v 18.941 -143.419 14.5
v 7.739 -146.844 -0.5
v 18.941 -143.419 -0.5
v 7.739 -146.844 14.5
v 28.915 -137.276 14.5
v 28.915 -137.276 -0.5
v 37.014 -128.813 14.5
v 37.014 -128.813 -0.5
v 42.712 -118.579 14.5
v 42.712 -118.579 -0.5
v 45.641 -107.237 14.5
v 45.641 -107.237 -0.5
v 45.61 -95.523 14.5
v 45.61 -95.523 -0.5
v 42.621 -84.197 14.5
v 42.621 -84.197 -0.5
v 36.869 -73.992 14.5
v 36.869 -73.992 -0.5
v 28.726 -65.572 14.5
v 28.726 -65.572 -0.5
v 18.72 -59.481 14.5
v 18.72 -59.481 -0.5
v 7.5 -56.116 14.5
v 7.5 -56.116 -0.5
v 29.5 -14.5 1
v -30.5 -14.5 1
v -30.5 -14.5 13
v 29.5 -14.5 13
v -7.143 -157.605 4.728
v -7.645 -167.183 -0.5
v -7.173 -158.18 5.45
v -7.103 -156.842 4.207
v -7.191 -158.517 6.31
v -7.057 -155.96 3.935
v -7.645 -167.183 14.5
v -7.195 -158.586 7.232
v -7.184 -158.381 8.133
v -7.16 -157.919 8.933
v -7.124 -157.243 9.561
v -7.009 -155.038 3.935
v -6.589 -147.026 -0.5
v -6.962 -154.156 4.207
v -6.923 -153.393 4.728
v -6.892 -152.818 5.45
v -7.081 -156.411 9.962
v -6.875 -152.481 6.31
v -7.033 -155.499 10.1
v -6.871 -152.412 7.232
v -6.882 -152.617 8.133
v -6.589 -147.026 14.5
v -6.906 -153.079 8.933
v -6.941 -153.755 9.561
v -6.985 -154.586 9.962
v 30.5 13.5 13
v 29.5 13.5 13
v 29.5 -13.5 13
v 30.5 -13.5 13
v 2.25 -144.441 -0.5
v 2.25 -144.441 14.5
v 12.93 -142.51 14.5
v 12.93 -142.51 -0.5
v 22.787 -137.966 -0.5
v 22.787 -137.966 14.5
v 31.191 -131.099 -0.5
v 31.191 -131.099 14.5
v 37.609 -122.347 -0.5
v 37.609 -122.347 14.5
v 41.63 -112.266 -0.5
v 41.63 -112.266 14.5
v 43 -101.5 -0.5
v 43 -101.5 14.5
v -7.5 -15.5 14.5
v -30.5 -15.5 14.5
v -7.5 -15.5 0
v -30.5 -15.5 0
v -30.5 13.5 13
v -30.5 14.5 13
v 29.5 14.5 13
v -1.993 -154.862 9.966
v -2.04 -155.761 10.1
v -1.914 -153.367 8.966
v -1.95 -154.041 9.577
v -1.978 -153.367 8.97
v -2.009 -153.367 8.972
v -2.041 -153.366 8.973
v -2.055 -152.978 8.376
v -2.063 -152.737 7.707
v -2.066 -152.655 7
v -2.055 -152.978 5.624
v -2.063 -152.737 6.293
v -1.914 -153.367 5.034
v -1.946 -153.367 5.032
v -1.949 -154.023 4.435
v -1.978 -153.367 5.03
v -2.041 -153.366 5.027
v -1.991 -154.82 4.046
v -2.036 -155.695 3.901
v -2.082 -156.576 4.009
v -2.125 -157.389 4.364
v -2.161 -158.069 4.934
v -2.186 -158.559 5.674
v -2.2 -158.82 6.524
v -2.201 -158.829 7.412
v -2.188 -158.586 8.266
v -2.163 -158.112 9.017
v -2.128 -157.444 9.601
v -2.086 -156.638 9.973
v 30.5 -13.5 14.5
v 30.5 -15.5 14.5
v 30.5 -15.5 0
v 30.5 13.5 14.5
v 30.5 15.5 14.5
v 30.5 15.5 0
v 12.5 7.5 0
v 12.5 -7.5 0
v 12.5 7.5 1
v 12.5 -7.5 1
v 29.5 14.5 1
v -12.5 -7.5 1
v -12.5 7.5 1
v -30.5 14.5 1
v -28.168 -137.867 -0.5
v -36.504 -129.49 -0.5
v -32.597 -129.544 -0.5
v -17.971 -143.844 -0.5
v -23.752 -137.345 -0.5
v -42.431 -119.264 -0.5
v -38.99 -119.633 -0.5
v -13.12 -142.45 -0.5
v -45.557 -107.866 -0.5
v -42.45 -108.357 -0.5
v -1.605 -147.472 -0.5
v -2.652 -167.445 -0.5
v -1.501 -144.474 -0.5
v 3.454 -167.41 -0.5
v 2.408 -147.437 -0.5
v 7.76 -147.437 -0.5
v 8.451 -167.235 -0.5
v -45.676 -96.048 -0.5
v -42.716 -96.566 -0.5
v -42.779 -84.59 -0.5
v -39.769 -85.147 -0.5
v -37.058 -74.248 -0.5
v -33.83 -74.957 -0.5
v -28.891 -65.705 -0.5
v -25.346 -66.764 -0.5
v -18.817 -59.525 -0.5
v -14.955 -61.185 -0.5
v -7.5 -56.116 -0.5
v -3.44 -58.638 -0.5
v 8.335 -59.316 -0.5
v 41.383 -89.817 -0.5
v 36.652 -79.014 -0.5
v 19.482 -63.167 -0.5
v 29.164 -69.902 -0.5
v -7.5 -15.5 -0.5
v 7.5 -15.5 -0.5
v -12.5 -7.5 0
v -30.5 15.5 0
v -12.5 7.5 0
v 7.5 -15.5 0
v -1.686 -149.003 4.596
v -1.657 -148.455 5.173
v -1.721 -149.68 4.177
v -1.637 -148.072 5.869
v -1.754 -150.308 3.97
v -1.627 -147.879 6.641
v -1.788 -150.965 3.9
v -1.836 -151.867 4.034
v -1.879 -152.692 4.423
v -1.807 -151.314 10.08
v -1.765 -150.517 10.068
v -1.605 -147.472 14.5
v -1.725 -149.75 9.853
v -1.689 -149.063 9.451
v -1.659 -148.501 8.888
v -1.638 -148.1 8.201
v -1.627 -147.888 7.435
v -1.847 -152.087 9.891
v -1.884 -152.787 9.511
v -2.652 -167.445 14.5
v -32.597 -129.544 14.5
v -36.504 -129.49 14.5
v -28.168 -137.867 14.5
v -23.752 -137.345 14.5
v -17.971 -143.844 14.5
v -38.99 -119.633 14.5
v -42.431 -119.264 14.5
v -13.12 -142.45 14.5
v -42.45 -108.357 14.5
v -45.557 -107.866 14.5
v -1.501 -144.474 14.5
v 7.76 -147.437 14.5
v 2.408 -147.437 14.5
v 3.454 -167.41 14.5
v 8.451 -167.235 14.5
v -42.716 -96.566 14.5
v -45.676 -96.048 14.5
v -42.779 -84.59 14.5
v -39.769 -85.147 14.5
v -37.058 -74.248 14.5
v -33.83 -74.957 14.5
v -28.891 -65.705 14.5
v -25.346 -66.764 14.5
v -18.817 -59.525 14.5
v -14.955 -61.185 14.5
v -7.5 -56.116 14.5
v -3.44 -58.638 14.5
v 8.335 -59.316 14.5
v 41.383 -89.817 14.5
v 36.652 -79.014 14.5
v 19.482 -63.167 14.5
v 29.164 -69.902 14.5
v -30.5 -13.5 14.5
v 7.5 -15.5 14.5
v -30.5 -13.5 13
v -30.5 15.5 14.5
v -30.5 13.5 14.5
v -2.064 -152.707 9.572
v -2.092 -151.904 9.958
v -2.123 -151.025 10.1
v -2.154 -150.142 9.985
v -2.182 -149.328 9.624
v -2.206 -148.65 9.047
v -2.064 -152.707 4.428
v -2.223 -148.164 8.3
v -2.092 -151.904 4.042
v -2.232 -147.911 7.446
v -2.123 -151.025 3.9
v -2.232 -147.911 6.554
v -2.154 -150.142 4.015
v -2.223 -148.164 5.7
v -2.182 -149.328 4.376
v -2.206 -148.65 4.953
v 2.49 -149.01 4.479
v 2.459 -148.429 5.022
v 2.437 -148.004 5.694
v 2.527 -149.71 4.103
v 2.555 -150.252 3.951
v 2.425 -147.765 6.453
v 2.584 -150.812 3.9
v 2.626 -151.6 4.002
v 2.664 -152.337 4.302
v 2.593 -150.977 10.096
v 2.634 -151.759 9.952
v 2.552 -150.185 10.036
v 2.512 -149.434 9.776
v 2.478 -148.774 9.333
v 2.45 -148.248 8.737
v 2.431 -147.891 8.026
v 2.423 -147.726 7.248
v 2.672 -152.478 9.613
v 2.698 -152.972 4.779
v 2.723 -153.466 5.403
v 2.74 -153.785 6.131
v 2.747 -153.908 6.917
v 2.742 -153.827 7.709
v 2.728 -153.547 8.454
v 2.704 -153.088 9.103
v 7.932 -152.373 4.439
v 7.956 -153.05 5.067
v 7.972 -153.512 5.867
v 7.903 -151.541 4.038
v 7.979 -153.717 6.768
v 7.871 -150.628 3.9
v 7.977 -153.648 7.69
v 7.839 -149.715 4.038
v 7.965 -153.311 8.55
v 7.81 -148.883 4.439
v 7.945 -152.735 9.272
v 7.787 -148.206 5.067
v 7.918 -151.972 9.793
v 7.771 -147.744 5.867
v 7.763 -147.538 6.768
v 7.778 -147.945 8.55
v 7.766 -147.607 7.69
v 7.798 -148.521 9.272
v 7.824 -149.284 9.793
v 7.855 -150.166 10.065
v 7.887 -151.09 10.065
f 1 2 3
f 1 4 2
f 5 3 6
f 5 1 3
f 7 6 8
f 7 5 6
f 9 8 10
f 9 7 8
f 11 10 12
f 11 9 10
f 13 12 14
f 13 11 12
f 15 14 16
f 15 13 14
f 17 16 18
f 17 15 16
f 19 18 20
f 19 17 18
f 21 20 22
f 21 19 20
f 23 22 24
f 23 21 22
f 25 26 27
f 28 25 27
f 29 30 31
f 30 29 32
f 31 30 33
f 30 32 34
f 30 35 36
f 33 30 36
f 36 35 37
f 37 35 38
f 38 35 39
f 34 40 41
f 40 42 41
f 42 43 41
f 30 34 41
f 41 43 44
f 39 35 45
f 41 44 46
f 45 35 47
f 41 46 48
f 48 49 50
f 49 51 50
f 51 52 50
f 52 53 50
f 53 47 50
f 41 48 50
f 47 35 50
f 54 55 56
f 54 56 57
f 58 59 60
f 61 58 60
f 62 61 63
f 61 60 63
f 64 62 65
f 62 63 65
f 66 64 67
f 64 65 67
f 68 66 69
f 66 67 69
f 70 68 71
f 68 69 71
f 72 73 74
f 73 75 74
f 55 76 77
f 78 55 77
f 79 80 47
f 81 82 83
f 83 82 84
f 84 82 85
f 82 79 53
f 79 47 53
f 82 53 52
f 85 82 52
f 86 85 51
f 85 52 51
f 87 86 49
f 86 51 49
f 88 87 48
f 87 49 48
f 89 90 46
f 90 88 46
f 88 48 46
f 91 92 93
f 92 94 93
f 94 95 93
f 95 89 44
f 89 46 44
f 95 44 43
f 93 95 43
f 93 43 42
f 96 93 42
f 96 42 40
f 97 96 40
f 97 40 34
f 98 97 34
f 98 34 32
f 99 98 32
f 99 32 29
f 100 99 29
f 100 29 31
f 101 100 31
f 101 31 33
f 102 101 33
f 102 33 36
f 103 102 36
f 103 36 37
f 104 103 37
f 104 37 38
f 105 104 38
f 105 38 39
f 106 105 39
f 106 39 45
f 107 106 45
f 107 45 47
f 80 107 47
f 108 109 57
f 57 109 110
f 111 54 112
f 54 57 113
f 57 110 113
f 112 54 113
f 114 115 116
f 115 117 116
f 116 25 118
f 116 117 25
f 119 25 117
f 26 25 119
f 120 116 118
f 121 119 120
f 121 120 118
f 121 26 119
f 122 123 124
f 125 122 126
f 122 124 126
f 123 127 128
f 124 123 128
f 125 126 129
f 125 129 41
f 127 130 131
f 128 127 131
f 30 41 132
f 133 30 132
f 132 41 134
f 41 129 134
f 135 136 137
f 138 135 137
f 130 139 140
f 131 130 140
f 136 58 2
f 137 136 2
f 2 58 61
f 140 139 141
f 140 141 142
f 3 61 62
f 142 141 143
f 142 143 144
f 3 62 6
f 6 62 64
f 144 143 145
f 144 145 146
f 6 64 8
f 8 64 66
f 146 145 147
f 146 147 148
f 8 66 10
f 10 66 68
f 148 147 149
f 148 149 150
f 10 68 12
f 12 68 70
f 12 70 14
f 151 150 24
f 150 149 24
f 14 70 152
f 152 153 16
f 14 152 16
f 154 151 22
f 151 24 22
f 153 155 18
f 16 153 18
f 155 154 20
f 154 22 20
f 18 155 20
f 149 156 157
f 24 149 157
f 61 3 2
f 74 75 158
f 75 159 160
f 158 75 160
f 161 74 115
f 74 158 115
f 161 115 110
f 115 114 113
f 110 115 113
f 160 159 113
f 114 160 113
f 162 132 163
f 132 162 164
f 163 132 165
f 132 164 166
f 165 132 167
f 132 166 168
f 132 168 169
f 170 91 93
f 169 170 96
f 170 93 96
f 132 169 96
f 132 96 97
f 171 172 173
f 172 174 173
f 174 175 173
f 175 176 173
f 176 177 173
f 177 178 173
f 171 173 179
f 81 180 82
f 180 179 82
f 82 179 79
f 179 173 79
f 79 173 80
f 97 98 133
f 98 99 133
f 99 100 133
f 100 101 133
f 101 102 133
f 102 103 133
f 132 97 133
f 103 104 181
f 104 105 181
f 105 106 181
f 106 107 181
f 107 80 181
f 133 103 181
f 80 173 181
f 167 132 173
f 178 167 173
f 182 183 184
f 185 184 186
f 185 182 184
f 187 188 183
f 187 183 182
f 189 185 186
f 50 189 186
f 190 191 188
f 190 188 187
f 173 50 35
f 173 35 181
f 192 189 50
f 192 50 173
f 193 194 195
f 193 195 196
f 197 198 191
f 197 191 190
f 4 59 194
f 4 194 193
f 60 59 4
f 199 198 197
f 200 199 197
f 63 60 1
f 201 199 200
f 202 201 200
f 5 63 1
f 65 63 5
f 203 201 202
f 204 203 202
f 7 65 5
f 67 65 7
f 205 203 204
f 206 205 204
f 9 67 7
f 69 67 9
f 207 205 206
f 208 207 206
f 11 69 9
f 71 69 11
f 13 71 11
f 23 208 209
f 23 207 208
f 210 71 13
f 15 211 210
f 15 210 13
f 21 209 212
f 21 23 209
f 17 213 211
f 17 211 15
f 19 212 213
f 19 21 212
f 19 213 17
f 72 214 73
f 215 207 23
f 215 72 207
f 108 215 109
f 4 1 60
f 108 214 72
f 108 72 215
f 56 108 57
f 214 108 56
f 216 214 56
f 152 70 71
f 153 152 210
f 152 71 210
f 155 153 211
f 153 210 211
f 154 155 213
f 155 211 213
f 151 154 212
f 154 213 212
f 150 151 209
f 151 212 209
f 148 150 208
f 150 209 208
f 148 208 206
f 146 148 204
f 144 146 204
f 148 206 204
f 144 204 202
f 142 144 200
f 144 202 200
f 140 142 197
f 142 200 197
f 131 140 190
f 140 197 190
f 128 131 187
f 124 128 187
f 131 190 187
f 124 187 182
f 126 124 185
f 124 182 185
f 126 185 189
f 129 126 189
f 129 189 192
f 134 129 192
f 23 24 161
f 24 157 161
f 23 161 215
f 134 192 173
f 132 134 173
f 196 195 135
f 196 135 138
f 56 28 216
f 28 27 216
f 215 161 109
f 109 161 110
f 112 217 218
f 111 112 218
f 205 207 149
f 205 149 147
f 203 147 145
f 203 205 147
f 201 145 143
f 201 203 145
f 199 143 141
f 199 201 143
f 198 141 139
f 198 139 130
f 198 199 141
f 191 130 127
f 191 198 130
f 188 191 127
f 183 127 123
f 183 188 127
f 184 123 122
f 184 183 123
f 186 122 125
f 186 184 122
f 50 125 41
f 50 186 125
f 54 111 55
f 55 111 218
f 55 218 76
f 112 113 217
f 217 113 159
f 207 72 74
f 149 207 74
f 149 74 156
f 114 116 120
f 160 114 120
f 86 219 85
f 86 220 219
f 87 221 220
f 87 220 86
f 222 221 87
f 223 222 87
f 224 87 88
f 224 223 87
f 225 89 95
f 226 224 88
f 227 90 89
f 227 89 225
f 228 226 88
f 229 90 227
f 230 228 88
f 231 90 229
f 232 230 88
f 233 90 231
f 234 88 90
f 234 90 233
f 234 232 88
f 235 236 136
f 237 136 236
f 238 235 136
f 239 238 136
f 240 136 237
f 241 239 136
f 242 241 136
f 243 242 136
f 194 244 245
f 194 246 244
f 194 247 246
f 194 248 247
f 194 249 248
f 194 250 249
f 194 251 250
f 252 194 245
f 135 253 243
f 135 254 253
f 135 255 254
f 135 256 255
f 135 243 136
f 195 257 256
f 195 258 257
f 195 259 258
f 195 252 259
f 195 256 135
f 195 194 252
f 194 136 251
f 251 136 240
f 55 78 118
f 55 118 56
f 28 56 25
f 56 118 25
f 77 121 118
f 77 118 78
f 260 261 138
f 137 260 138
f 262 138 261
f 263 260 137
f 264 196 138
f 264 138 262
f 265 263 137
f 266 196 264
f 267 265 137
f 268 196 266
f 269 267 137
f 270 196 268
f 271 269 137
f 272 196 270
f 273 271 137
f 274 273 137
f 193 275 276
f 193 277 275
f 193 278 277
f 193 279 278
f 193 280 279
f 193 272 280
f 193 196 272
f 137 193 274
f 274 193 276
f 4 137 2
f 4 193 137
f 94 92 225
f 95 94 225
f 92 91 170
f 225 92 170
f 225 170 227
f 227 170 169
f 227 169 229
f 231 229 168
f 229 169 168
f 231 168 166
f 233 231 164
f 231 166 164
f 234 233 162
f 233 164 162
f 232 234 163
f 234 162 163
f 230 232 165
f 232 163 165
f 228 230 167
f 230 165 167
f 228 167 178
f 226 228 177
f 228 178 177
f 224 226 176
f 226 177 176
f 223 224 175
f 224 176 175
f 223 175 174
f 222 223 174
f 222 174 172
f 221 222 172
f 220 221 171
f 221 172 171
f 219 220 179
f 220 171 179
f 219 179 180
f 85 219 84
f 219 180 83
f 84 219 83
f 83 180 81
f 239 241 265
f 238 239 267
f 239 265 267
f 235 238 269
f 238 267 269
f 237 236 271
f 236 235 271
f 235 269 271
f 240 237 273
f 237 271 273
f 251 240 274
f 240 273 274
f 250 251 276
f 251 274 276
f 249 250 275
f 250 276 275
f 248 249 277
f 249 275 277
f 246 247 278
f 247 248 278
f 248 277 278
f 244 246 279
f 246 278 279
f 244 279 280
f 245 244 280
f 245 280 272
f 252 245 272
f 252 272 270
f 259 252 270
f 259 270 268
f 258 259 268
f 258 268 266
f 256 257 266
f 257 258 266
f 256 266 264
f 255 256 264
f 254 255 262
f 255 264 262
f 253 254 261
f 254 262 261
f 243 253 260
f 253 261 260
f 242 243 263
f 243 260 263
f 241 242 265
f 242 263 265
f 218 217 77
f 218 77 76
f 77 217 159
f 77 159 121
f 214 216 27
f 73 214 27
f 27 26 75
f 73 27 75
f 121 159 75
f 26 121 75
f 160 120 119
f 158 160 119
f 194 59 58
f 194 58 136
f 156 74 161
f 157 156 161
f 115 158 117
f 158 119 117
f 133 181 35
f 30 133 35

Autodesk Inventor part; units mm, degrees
ref_plane "YZ Plane" through (0, 0, 0) normal (1, 0, 0) x (0, 1, 0)
ref_plane "XZ Plane" through (0, 0, 0) normal (0, 1, 0) x (-1, 0, 0)
ref_plane "XY Plane" through (0, 0, 0) normal (0, 0, 1) x (1, 0, 0)
sketch "스케치1" plane through (0, 0, 0) normal (0, 0, 1) x (1, 0, 0)
  line L0 (-29.5, 14.5) -> (29.5, 14.5)
  line L1 (29.5, 14.5) -> (29.5, -14.5)
  line L2 (29.5, -14.5) -> (-29.5, -14.5)
  line L3 (-29.5, -14.5) -> (-29.5, 14.5)
  line L4 (-29.5, 14.5) -> (29.5, -14.5) construction
  line L5 (29.5, 14.5) -> (-29.5, -14.5) construction
  line L6 (30.5, 15.5) -> (-30.5, 15.5)
  line L7 (-30.5, 15.5) -> (-30.5, -15.5)
  line L8 (-30.5, -15.5) -> (30.5, -15.5)
  line L9 (30.5, -15.5) -> (30.5, 15.5)
  point P0 (0, 0)
  dimension "d0" = 59
  dimension "d1" = 29
  dimension "d4" = 1
extrude "돌출1" add sketch "스케치1" along normal blind 1 contours L0 L1 L2 L3 | L9 L8 L7 L6
sketch "스케치2" plane through (0, 0, 1) normal (0, 0, 1) x (1, 0, 0)
  line L0 (30.5, -15.5) -> (30.5, 15.5) projected
  line L1 (-30.5, -15.5) -> (30.5, -15.5)
  line L2 (30.5, -15.5) -> (30.5, 15.5)
  line L3 (30.5, 15.5) -> (-30.5, 15.5)
  line L4 (-30.5, 15.5) -> (-30.5, -15.5)
  line L5 (-30.5, -15.5) -> (30.5, 15.5) construction
  line L6 (30.5, -15.5) -> (-30.5, 15.5) construction
  line L7 (-29.5, 14.5) -> (29.5, 14.5)
  line L8 (29.5, 14.5) -> (29.5, -14.5)
  line L9 (29.5, -14.5) -> (-29.5, -14.5)
  line L10 (-29.5, -14.5) -> (-29.5, 14.5)
  point P0 (2.95, 1.45)
  dimension "d5" = 1
extrude "돌출2" add sketch "스케치2" along normal blind 12
sketch "스케치3" plane through (0, 0, 1) normal (0, 0, 1) x (1, 0, 0)
  line L0 (-12.5, -7.5) -> (12.5, -7.5)
  line L1 (12.5, -7.5) -> (12.5, 7.5)
  line L2 (12.5, 7.5) -> (-12.5, 7.5)
  line L3 (-12.5, 7.5) -> (-12.5, -7.5)
  line L4 (-12.5, -7.5) -> (12.5, 7.5) construction
  line L5 (12.5, -7.5) -> (-12.5, 7.5) construction
  point P0 (0, 0)
  dimension "d8" = 25
  dimension "d9" = 15
extrude "돌출3" cut sketch "스케치3" against normal blind 12
sketch "스케치4" plane through (-30.5, -15.5, 0) normal (-1, 0, 0) x (0, 0, 1)
  line L0 (1, 30) -> (13, 30) projected
  line L1 (1, 1) -> (1, 30) projected
  line L2 (13, 30) -> (1, 30)
  line L3 (1, 30) -> (1, 1)
  line L4 (1, 1) -> (13, 1)
  line L5 (13, 1) -> (13, 30)
  point P0 (0, 15.5)
extrude "돌출4" cut sketch "스케치4" against normal blind 15
sketch "스케치5" plane through (-30.5, -15.5, 0) normal (-1, 0, 0) x (0, 0, 1)
  line L0 (13, 0) -> (13, 31) projected
  line L1 (13, 31) -> (14.5, 31)
  line L2 (14.5, 31) -> (14.5, 29)
  line L3 (14.5, 29) -> (13, 29)
  line L4 (13, 29) -> (13, 31)
  line L5 (13, 0) -> (14.5, 0)
  line L6 (14.5, 0) -> (14.5, 2)
  line L7 (14.5, 2) -> (13, 2)
  line L8 (13, 2) -> (13, 0)
  point P0 (0, 15.5)
  point P1 (13, 2)
  dimension "d14" = 1.5
  dimension "d15" = 2
  dimension "d16" = 2
extrude "돌출5" add sketch "스케치5" against normal up to surface (61 mm away)
sketch "스케치6" plane through (-30.5, -15.5, 0) normal (0, -1, 0) x (1, 0, 0)
  line L0 (0, 14.5) -> (61, 14.5) projected
  line L1 (23, -0.5) -> (38, -0.5)
  line L2 (38, -0.5) -> (38, 14.5)
  line L3 (38, 14.5) -> (23, 14.5)
  line L4 (23, 14.5) -> (23, -0.5)
  line L5 (23, -0.5) -> (38, 14.5) construction
  line L6 (38, -0.5) -> (23, 14.5) construction
  point P0 (30.5, 0)
  point P1 (30.5, 7)
  dimension "d19" = 15
extrude "돌출6" add sketch "스케치6" along normal blind 40
sketch "스케치7" plane through (-30.5, -13.5, 14.5) normal (0, 0, 1) x (1, 0, 0)
  line L0 (38, -42) -> (23, -42) projected
  line L1 (30.5, -42) -> (30.5, -88)
  circle A0 centre (30.5, -88) radius 46
  circle A1 centre (30.5, -88) radius 43
  line L2 (23, -42) -> (23, -42.6155)
  line L3 (38, -2) -> (38, -42) projected
  line L4 (38, -42) -> (38, -42.6155)
  line L5 (30.5, -88) -> (32.9075, -133.937)
  line L6 (30.5, -88) -> (76.5, -88) construction
  line L7 (30.5, -88) -> (28.8946, -133.972)
  line L8 (28.8946, -133.972) -> (27.8479, -153.9446)
  line L9 (28.8946, -133.972) -> (48.8946, -133.972) construction
  line L10 (32.9075, -133.937) -> (33.9542, -153.9095)
  line L11 (32.9075, -133.937) -> (52.9075, -133.937) construction
  line L12 (33.9542, -153.9095) -> (38.9511, -153.7351)
  line L13 (33.9542, -153.9095) -> (38.9542, -153.9095) construction
  line L14 (38.9511, -153.7351) -> (38.2598, -133.937)
  line L15 (27.8479, -153.9446) -> (29.0856, -153.9446) construction
  line L16 (38.2598, -133.937) -> (38.2391, -133.3443)
  line L17 (27.8479, -153.9446) -> (22.8548, -153.6829)
  line L18 (27.8479, -153.9446) -> (32.8479, -153.9446) construction
  line L19 (22.8548, -153.6829) -> (23.9112, -133.5257)
  point P0 (30.5, 13.5)
  point P1 (27.1993, -133.8814)
  point P2 (32.7504, -130.9411)
  point P3 (28.9993, -130.9738)
  dimension "d22" = 46
  dimension "d23" = 3
  dimension "d24" = 87
  dimension "d25" = 20
  dimension "d26" = 93
  dimension "d27" = 20
  dimension "d28" = 87
  dimension "d29" = 5
  dimension "d30" = 2
  dimension "d31" = 90
  dimension "d42" = 5
  dimension "d43" = 177
  dimension "d44" = 90
extrude "돌출7" add sketch "스케치7" against normal up to surface (15 mm away) contours L4 A0 L0 | A0 L2 L0 | A0 L5 A1 L1 | L1 A1 L7 A0 | A0 L8 L17 L19 | L16 L14 L12 L10 A0
sketch "스케치9" plane through (7.7391, -146.8443, 14.5) normal (0.9994, 0.0349, 0) x (0, 0, -1)
  line L0 (0, -20.2251) -> (0, 2.6915) projected
  line L1 (0, -8.7668) -> (15, 1.1952)
  line L2 (15, -0.3012) -> (15, 2.6915) projected
  circle A0 centre (7.5, -3.7858) radius 3.1
  point P0 (14.5, 147.025)
  point P1 (15, -19.971)
  dimension "d39" = 6.2
extrude "돌출9" cut sketch "스케치9" against normal blind 10
sketch "스케치10" plane through (-7.6452, -167.1829, -0.5) normal (-0.9986, 0.0523, 0) x (0, 0, 1)
  line L0 (15, 0) -> (0, 0) projected
  line L1 (7.5, 0) -> (7.5, 11.7)
  circle A0 centre (7.5, 11.7) radius 3.1
  point P0 (0.5, 167.3539)
  dimension "d45" = 11.7
  dimension "d46" = 6.2
extrude "돌출10" cut sketch "스케치10" against normal up to surface (5 mm away)
properties part number "camera_robotarm2"
